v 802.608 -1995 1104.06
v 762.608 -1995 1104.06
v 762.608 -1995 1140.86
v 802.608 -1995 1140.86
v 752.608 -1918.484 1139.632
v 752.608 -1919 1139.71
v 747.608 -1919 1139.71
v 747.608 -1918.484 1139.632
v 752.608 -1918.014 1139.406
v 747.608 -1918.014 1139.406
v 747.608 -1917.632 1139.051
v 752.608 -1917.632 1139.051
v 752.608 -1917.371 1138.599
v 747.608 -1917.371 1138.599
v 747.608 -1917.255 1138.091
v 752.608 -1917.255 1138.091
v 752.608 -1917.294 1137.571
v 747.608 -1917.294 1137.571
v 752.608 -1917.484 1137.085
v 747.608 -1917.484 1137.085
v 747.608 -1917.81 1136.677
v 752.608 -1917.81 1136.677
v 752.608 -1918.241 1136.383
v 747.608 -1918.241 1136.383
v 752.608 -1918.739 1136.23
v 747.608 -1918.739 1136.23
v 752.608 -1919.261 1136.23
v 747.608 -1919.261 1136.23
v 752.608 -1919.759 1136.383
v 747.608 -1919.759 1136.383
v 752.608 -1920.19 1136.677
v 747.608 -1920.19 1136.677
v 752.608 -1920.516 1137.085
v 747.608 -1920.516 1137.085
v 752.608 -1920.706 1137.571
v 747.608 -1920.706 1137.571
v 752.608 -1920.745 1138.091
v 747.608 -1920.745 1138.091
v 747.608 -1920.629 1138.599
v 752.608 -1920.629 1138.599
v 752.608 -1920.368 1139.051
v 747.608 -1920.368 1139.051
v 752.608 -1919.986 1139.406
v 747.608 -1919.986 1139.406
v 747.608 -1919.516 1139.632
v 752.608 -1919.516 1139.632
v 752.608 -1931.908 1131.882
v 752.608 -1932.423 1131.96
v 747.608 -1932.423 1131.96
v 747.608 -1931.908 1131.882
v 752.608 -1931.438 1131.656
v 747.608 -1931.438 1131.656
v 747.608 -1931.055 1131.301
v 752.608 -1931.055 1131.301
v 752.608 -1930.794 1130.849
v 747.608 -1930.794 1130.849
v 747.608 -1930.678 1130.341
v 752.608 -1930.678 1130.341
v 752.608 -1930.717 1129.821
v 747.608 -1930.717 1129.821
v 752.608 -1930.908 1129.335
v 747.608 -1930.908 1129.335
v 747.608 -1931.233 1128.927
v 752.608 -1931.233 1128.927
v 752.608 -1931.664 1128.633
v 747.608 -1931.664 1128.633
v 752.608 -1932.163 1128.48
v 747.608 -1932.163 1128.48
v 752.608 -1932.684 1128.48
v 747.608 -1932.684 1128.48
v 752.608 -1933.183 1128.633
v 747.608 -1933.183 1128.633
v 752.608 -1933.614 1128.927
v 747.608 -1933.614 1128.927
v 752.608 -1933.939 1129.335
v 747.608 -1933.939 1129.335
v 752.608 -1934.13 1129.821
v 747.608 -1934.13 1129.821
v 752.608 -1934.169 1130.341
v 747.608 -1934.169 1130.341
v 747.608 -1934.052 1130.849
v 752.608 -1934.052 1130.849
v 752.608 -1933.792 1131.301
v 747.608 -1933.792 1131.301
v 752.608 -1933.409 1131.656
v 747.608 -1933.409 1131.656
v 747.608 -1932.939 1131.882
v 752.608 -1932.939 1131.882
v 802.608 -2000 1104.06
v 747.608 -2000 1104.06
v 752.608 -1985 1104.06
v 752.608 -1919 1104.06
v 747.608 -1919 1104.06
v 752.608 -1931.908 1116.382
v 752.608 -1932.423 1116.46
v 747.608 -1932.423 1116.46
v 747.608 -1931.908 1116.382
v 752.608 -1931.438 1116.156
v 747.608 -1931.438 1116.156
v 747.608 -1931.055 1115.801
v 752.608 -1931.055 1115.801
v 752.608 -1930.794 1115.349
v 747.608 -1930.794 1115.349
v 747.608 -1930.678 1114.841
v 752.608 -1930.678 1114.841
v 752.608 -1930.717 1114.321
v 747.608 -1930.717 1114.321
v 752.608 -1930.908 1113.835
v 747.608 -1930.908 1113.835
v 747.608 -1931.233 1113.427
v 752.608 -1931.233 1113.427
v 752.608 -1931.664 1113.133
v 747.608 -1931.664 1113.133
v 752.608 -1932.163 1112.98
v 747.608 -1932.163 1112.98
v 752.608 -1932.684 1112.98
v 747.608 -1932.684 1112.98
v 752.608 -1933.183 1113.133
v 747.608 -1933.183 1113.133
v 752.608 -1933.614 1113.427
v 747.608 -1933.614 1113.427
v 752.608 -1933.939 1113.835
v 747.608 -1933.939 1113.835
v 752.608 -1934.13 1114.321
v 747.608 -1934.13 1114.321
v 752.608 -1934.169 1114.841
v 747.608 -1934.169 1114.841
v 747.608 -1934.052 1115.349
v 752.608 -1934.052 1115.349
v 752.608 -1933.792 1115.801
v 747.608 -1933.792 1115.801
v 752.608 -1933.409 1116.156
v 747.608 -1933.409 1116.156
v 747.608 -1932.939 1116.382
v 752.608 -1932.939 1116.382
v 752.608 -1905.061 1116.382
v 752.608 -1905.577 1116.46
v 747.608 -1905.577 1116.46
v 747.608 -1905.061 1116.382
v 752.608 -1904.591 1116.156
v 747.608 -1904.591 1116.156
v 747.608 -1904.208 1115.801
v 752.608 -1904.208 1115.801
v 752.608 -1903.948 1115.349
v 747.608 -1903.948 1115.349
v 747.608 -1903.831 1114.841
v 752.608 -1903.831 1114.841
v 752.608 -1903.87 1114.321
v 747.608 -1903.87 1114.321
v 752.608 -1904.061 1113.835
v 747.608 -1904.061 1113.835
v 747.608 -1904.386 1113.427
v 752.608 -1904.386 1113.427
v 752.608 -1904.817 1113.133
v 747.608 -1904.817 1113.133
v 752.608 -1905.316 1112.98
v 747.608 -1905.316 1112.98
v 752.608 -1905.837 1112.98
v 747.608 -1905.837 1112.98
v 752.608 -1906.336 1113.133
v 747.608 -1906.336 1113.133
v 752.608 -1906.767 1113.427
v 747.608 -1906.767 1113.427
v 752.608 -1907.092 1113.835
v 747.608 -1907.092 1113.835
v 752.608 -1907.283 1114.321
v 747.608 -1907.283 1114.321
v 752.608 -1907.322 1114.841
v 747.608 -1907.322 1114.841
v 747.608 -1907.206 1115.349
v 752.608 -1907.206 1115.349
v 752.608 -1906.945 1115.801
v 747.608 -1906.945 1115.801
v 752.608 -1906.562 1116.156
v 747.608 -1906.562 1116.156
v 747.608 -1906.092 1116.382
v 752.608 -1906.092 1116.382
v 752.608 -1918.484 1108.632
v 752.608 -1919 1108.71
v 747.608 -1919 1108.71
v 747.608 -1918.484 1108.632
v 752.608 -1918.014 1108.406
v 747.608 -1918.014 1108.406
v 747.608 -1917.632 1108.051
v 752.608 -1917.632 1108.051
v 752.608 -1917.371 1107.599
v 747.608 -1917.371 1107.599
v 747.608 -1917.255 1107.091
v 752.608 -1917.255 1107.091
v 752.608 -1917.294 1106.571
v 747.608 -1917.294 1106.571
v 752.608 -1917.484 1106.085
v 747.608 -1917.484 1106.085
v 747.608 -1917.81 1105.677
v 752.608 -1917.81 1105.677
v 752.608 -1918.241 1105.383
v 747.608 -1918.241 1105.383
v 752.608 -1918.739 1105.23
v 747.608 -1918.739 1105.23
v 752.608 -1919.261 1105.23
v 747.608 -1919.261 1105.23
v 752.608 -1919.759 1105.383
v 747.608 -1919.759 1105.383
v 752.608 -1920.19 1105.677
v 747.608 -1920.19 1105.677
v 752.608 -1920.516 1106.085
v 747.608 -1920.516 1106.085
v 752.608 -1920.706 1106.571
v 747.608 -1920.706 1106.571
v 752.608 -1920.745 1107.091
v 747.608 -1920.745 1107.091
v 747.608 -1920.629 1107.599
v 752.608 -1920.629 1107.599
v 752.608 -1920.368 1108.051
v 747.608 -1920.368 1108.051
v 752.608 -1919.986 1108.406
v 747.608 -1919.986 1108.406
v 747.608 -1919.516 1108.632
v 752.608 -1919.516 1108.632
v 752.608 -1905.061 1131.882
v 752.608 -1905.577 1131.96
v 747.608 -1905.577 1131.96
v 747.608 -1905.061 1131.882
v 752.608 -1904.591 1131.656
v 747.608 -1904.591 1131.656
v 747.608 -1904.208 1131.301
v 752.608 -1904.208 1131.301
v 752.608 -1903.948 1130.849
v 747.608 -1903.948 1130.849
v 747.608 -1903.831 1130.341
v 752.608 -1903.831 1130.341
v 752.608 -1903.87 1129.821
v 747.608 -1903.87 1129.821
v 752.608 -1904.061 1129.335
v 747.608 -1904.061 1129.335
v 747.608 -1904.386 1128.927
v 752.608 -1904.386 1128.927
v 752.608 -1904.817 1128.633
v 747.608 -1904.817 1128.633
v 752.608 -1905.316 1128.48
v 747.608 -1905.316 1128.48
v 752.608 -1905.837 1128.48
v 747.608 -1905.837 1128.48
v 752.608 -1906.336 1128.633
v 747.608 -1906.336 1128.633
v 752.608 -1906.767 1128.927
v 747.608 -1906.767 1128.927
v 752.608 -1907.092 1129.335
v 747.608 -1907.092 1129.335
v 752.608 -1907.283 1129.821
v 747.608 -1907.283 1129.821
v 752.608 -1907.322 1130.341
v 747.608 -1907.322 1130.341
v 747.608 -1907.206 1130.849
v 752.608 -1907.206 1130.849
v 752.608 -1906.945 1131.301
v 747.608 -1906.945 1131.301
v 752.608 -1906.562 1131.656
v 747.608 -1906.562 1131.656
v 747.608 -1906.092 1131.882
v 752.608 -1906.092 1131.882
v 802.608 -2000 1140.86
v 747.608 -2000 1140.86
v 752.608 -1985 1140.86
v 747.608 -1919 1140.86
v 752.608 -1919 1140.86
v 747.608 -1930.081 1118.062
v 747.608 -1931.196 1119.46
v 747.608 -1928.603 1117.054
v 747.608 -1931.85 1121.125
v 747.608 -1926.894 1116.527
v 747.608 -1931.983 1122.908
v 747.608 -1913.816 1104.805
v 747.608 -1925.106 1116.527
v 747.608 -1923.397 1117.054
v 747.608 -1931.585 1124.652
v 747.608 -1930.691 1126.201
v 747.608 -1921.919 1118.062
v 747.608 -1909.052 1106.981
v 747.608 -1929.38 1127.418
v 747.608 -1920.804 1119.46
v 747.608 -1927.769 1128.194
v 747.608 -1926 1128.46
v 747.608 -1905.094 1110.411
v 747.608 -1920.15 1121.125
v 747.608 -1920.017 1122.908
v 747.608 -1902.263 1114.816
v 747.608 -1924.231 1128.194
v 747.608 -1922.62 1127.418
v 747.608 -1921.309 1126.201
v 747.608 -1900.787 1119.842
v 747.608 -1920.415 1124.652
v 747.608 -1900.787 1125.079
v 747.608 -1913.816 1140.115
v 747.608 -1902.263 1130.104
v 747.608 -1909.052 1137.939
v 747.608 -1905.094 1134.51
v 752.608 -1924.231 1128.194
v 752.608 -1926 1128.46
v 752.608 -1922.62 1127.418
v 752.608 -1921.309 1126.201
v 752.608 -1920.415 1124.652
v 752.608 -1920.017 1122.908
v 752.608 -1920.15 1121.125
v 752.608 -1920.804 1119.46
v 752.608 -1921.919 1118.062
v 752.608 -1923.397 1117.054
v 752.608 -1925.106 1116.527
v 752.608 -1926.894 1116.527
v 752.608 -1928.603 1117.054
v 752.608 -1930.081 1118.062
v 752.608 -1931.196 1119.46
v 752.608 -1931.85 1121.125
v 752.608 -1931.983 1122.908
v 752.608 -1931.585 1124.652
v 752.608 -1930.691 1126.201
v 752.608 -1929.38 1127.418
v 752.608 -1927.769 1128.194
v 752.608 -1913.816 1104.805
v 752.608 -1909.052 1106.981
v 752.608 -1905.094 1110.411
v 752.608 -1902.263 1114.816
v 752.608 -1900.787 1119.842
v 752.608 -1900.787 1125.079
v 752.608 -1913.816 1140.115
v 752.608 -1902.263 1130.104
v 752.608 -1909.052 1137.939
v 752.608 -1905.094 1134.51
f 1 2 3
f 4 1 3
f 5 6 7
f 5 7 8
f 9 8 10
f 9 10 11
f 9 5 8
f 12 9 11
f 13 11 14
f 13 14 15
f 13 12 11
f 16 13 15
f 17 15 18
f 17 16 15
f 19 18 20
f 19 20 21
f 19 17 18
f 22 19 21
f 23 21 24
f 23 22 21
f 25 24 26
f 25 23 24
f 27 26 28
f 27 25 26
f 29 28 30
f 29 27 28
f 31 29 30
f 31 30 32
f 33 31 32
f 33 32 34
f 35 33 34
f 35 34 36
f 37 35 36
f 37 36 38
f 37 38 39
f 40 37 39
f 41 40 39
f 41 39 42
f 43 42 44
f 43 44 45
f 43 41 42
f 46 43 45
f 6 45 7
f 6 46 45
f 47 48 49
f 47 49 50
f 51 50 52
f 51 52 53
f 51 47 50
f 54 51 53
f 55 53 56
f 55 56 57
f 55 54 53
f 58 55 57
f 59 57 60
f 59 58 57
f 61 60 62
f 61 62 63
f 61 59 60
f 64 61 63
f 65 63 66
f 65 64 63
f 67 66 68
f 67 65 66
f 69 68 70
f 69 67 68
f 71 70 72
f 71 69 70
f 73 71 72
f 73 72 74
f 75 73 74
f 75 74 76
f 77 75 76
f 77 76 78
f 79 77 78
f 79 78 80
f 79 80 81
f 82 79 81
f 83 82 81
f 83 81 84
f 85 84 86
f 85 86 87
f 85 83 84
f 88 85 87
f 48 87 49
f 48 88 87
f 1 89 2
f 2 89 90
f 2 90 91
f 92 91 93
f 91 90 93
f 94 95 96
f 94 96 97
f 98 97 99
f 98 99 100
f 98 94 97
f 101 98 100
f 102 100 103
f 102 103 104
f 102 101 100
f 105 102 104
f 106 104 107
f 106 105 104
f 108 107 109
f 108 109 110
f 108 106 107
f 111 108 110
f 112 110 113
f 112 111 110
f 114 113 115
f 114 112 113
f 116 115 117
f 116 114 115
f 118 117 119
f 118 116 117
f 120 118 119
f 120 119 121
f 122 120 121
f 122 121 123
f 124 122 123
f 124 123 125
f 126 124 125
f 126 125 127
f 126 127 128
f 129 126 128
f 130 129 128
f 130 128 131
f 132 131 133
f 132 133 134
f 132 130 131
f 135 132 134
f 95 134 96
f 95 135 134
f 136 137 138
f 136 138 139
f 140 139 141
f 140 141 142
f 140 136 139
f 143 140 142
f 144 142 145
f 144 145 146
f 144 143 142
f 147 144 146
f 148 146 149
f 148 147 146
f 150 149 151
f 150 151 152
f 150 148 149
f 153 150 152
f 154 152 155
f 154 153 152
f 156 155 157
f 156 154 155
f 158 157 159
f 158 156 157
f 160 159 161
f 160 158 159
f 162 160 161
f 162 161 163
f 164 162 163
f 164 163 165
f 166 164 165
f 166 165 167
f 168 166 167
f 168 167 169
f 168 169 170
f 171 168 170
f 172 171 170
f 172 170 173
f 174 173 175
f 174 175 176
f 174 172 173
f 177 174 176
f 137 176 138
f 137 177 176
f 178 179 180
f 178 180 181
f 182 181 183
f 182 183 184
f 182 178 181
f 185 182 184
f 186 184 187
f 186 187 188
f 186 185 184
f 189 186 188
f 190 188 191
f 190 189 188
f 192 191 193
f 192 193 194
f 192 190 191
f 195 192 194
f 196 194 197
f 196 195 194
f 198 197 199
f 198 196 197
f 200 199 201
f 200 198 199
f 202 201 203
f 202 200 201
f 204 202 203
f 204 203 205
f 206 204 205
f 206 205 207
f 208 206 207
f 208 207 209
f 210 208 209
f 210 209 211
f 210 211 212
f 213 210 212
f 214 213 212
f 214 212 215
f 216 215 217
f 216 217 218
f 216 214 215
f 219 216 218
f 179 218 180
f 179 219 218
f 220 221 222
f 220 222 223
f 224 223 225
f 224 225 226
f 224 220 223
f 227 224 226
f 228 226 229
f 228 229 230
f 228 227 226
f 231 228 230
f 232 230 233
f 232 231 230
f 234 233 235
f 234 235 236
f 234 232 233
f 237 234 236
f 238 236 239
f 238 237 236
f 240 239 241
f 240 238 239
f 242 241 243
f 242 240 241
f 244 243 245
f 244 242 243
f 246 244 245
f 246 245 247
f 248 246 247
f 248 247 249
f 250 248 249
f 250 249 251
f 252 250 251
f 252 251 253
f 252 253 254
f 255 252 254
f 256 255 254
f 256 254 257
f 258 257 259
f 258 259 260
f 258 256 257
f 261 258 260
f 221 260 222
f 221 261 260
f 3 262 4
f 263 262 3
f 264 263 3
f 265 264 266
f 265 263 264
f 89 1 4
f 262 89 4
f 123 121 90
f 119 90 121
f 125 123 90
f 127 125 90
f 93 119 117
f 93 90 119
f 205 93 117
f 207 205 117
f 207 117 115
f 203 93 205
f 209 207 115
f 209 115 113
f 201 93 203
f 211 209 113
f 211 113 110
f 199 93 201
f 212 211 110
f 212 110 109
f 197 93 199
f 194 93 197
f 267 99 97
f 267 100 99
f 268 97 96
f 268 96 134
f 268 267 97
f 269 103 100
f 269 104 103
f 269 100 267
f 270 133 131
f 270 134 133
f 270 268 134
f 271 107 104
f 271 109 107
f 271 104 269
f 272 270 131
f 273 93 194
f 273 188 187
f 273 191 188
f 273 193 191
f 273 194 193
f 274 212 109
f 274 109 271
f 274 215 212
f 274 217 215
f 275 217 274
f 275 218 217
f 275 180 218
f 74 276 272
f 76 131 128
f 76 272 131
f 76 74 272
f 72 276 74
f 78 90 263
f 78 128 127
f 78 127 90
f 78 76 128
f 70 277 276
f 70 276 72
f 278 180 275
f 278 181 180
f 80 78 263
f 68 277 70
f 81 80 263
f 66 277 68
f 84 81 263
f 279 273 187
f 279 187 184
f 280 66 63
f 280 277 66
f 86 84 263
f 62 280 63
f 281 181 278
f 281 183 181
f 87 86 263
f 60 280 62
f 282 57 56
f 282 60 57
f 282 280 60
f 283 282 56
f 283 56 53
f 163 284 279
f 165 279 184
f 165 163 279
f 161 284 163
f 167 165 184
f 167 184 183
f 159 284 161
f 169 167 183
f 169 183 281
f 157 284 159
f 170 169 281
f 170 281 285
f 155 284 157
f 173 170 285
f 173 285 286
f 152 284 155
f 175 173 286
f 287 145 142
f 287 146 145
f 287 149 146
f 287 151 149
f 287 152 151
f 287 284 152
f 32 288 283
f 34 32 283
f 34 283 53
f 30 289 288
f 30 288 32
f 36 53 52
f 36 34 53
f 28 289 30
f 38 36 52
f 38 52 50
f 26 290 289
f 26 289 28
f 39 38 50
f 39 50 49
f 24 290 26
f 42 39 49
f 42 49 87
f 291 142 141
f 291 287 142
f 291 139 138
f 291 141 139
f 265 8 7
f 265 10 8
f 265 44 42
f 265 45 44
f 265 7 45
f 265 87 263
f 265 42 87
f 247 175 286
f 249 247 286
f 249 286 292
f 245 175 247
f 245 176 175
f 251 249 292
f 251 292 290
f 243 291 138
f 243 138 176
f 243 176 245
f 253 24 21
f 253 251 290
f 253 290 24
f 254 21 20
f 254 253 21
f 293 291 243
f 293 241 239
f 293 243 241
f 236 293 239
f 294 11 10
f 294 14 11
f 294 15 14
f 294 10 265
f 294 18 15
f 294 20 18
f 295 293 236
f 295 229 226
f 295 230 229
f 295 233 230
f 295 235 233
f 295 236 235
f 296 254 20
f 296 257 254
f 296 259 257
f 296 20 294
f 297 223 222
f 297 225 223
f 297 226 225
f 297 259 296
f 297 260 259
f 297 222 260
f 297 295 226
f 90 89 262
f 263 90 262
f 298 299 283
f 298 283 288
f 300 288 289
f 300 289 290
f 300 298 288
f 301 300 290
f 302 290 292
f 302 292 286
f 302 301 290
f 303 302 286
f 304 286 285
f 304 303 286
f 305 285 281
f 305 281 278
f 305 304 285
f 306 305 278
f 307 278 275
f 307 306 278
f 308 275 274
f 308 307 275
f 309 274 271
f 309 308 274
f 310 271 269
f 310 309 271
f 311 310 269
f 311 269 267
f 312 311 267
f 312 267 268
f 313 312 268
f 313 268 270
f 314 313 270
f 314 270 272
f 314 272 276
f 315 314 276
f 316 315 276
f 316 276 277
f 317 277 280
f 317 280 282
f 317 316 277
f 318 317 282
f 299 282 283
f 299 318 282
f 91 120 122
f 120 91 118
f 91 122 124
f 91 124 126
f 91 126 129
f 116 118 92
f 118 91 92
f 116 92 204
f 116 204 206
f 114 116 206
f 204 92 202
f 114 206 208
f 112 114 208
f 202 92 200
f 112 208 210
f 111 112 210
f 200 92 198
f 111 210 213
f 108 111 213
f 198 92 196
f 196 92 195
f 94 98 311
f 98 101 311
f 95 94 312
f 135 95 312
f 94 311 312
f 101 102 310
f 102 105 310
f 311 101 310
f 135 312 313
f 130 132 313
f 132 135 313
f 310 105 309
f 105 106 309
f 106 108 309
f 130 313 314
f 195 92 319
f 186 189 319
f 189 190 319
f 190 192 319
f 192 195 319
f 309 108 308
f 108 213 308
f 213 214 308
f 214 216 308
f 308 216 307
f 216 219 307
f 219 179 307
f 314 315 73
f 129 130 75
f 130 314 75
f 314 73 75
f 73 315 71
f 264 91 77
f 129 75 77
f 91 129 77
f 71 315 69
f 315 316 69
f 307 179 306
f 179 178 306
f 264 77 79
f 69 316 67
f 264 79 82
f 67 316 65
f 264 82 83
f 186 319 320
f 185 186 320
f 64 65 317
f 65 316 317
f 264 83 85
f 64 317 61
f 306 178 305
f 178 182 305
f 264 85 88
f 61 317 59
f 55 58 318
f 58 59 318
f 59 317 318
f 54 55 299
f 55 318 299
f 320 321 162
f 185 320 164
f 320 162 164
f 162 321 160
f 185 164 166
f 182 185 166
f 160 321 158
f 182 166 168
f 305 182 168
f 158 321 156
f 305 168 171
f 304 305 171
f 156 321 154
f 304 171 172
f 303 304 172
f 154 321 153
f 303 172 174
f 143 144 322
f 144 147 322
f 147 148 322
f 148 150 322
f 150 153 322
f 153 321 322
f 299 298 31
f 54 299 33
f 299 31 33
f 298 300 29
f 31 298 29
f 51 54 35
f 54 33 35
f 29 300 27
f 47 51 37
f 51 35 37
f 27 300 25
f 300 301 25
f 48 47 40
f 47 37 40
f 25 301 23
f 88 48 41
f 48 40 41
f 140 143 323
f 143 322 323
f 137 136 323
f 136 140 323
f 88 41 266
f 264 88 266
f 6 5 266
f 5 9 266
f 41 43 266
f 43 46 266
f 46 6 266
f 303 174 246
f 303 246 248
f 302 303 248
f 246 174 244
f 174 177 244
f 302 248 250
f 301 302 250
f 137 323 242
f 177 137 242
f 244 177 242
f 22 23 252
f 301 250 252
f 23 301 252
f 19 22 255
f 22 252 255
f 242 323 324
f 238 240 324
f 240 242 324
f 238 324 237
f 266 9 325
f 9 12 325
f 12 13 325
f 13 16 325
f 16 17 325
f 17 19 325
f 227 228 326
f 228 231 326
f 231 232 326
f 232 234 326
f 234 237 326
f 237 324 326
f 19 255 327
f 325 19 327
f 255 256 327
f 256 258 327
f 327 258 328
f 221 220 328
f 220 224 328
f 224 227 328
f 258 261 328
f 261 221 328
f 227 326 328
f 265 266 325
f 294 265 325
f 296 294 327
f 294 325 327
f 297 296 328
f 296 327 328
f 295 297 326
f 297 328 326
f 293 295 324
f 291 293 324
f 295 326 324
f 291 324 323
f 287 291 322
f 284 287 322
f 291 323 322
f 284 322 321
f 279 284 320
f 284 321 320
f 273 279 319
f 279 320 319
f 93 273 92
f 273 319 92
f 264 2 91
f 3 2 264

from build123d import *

# Parameters (mm, degrees)
SZKIC1_R                    = 1.75
SZKIC1_R_2                  = 6
DODANIE_WYCI_GNI_CIE1_DEPTH = 5
SZKIC2_W                    = 36.8
SZKIC2_H                    = 5
DODANIE_WYCI_GNI_CIE2_DEPTH = 50
SFAZOWANIE1_SIZE            = 10


with BuildPart() as part:
    # Szkic1 → Dodanie-wyciągnięcie1 (new body)
    with BuildSketch(Plane.ZY.offset(-752.608350006)):
        with BuildLine():
            Line((1140.860111381, -2000), (1140.860111381, -1919))
            ThreePointArc((1140.860111381, -1919), (1122.460111381, -1900.6), (1104.060111381, -1919))
            Line((1104.060111381, -1919), (1104.060111381, -2000))
            Line((1104.060111381, -2000), (1140.860111381, -2000))
        make_face()
        with Locations((1114.710111381, -1932.423393759)):
            Circle(SZKIC1_R, mode=Mode.SUBTRACT)
        with Locations((1122.460111381, -1926)):
            Circle(SZKIC1_R_2, mode=Mode.SUBTRACT)
        with Locations((1106.960111381, -1919)):
            Circle(SZKIC1_R, mode=Mode.SUBTRACT)
        with Locations((1114.710111381, -1905.576606241)):
            Circle(SZKIC1_R, mode=Mode.SUBTRACT)
        with Locations((1130.210111381, -1932.423393759)):
            Circle(SZKIC1_R, mode=Mode.SUBTRACT)
        with Locations((1130.210111381, -1905.576606241)):
            Circle(SZKIC1_R, mode=Mode.SUBTRACT)
        with Locations((1137.960111381, -1919)):
            Circle(SZKIC1_R, mode=Mode.SUBTRACT)
    extrude(amount=DODANIE_WYCI_GNI_CIE1_DEPTH)

    # Szkic2 → Dodanie-wyciągnięcie2 (add)
    with BuildSketch(Plane.ZY.offset(-752.608350006)):
        with Locations((1122.460111381, -1997.5)):
            Rectangle(SZKIC2_W, SZKIC2_H)
    extrude(amount=-DODANIE_WYCI_GNI_CIE2_DEPTH)

    # Sfazowanie1
    sfazowanie1_edges = [part.edges().sort_by_distance(p)[0] for p in [
        (752.608350006, -1995, 1122.460111381),
    ]]
    chamfer(sfazowanie1_edges, length=SFAZOWANIE1_SIZE)


solid = part.part
